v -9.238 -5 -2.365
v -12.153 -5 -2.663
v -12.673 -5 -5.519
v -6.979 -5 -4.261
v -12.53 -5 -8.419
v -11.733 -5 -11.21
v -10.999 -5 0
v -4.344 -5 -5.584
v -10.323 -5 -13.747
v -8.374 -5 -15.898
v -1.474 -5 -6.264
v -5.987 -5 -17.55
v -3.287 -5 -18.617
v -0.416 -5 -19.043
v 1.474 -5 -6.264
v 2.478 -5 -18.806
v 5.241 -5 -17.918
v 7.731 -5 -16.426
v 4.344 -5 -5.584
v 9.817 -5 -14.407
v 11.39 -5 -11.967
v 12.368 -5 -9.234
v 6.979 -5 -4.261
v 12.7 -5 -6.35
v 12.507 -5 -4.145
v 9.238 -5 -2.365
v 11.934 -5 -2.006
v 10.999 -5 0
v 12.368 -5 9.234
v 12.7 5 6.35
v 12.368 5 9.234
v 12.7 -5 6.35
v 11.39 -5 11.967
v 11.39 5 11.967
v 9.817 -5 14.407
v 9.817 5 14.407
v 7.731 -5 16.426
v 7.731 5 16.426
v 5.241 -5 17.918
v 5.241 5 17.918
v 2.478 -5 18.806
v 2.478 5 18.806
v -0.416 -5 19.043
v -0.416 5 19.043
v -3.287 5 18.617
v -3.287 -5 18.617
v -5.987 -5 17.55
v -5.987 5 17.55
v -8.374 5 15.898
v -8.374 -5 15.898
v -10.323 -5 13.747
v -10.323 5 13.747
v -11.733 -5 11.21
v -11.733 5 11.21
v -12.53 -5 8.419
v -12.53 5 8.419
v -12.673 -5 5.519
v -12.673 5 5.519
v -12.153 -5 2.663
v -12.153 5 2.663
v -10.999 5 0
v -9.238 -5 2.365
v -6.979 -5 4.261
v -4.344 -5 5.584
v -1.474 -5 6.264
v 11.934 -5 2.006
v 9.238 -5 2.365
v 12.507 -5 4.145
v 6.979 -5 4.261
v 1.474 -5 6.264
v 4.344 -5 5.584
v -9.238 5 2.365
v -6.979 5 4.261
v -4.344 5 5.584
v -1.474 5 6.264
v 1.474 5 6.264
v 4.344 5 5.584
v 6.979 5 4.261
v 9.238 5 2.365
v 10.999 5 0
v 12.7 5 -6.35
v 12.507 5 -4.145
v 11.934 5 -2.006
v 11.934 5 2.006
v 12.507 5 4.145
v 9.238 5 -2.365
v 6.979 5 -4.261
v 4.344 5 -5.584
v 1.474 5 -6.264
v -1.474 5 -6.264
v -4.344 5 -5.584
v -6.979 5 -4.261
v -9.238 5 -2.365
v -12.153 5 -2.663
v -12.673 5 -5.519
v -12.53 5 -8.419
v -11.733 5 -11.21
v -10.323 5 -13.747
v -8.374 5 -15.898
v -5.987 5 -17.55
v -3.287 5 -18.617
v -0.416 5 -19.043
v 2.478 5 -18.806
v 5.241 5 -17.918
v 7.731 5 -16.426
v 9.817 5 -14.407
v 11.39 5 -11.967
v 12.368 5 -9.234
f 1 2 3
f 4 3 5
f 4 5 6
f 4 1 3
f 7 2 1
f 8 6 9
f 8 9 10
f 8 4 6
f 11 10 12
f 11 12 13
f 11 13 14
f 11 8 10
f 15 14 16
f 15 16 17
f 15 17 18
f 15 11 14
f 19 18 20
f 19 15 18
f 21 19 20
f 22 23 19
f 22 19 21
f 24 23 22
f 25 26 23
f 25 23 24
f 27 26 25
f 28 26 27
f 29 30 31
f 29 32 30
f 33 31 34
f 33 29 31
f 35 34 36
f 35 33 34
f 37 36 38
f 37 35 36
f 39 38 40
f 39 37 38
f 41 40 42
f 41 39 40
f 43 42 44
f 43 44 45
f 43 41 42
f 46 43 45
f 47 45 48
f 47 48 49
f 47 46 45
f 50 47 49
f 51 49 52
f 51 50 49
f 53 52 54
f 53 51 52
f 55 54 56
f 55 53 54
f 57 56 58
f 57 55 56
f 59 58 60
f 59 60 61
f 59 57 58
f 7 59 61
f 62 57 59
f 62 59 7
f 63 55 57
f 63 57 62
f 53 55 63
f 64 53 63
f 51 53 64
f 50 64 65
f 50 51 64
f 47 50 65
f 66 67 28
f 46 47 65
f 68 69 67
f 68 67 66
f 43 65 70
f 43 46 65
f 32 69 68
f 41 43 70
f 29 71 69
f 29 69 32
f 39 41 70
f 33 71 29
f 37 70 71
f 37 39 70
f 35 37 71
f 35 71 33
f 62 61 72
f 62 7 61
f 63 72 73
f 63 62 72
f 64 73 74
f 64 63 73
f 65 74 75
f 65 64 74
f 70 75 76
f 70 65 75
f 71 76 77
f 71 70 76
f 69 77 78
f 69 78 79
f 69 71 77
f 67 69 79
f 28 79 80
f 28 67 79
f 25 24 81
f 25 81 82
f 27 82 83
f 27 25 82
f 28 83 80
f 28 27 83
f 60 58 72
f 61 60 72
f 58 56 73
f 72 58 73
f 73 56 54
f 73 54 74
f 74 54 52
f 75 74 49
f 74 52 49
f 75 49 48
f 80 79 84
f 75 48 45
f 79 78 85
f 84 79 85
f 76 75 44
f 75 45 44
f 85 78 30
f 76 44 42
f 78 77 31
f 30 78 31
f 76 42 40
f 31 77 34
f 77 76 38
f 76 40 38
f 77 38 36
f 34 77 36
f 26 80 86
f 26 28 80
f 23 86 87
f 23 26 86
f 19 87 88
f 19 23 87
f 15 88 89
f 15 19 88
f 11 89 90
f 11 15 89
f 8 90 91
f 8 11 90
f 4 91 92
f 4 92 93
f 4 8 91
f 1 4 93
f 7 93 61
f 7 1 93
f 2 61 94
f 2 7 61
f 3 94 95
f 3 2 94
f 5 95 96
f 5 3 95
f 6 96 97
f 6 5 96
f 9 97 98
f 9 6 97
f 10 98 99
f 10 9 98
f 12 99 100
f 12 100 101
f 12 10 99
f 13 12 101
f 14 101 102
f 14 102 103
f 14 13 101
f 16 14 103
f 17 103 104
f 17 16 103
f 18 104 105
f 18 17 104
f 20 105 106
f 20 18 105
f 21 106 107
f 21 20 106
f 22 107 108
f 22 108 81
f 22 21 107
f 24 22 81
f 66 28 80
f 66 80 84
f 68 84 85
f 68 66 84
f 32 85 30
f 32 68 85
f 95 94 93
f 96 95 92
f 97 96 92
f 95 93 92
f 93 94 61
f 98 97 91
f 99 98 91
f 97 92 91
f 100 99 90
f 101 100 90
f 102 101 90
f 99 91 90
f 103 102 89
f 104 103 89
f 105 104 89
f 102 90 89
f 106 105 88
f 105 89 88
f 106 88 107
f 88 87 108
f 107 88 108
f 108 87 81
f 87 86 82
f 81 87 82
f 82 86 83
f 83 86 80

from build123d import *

# Parameters (mm, degrees)
F1_DEPTH = 5


with BuildPart() as f1:
    # F0 (on Front) → F1 (new body, symmetric)
    with BuildSketch(Plane.XZ):
        with BuildLine():
            ThreePointArc((-10.9985226281, 0), (-3.2870018728, -18.6172579939), (12.7, -6.35))
            ThreePointArc((12.7, -6.35), (12.2672579939, -3.0629981272), (10.9985226281, 0))
            ThreePointArc((10.9985226281, 0), (0, -6.35), (-10.9985226281, 0))
        make_face()
    extrude(amount=F1_DEPTH, both=True)


with BuildPart() as f1b:
    # F0 (on Front) → F1, piece 2 (new body, symmetric)
    with BuildSketch(Plane.XZ):
        with BuildLine():
            ThreePointArc((-10.9985226281, 0), (0, 6.35), (10.9985226281, 0))
            ThreePointArc((10.9985226281, 0), (12.2672579939, 3.0629981272), (12.7, 6.35))
            ThreePointArc((12.7, 6.35), (-3.2870018728, 18.6172579939), (-10.9985226281, 0))
        make_face()
    extrude(amount=F1_DEPTH, both=True)


solid = Compound([f1.part, f1b.part])
